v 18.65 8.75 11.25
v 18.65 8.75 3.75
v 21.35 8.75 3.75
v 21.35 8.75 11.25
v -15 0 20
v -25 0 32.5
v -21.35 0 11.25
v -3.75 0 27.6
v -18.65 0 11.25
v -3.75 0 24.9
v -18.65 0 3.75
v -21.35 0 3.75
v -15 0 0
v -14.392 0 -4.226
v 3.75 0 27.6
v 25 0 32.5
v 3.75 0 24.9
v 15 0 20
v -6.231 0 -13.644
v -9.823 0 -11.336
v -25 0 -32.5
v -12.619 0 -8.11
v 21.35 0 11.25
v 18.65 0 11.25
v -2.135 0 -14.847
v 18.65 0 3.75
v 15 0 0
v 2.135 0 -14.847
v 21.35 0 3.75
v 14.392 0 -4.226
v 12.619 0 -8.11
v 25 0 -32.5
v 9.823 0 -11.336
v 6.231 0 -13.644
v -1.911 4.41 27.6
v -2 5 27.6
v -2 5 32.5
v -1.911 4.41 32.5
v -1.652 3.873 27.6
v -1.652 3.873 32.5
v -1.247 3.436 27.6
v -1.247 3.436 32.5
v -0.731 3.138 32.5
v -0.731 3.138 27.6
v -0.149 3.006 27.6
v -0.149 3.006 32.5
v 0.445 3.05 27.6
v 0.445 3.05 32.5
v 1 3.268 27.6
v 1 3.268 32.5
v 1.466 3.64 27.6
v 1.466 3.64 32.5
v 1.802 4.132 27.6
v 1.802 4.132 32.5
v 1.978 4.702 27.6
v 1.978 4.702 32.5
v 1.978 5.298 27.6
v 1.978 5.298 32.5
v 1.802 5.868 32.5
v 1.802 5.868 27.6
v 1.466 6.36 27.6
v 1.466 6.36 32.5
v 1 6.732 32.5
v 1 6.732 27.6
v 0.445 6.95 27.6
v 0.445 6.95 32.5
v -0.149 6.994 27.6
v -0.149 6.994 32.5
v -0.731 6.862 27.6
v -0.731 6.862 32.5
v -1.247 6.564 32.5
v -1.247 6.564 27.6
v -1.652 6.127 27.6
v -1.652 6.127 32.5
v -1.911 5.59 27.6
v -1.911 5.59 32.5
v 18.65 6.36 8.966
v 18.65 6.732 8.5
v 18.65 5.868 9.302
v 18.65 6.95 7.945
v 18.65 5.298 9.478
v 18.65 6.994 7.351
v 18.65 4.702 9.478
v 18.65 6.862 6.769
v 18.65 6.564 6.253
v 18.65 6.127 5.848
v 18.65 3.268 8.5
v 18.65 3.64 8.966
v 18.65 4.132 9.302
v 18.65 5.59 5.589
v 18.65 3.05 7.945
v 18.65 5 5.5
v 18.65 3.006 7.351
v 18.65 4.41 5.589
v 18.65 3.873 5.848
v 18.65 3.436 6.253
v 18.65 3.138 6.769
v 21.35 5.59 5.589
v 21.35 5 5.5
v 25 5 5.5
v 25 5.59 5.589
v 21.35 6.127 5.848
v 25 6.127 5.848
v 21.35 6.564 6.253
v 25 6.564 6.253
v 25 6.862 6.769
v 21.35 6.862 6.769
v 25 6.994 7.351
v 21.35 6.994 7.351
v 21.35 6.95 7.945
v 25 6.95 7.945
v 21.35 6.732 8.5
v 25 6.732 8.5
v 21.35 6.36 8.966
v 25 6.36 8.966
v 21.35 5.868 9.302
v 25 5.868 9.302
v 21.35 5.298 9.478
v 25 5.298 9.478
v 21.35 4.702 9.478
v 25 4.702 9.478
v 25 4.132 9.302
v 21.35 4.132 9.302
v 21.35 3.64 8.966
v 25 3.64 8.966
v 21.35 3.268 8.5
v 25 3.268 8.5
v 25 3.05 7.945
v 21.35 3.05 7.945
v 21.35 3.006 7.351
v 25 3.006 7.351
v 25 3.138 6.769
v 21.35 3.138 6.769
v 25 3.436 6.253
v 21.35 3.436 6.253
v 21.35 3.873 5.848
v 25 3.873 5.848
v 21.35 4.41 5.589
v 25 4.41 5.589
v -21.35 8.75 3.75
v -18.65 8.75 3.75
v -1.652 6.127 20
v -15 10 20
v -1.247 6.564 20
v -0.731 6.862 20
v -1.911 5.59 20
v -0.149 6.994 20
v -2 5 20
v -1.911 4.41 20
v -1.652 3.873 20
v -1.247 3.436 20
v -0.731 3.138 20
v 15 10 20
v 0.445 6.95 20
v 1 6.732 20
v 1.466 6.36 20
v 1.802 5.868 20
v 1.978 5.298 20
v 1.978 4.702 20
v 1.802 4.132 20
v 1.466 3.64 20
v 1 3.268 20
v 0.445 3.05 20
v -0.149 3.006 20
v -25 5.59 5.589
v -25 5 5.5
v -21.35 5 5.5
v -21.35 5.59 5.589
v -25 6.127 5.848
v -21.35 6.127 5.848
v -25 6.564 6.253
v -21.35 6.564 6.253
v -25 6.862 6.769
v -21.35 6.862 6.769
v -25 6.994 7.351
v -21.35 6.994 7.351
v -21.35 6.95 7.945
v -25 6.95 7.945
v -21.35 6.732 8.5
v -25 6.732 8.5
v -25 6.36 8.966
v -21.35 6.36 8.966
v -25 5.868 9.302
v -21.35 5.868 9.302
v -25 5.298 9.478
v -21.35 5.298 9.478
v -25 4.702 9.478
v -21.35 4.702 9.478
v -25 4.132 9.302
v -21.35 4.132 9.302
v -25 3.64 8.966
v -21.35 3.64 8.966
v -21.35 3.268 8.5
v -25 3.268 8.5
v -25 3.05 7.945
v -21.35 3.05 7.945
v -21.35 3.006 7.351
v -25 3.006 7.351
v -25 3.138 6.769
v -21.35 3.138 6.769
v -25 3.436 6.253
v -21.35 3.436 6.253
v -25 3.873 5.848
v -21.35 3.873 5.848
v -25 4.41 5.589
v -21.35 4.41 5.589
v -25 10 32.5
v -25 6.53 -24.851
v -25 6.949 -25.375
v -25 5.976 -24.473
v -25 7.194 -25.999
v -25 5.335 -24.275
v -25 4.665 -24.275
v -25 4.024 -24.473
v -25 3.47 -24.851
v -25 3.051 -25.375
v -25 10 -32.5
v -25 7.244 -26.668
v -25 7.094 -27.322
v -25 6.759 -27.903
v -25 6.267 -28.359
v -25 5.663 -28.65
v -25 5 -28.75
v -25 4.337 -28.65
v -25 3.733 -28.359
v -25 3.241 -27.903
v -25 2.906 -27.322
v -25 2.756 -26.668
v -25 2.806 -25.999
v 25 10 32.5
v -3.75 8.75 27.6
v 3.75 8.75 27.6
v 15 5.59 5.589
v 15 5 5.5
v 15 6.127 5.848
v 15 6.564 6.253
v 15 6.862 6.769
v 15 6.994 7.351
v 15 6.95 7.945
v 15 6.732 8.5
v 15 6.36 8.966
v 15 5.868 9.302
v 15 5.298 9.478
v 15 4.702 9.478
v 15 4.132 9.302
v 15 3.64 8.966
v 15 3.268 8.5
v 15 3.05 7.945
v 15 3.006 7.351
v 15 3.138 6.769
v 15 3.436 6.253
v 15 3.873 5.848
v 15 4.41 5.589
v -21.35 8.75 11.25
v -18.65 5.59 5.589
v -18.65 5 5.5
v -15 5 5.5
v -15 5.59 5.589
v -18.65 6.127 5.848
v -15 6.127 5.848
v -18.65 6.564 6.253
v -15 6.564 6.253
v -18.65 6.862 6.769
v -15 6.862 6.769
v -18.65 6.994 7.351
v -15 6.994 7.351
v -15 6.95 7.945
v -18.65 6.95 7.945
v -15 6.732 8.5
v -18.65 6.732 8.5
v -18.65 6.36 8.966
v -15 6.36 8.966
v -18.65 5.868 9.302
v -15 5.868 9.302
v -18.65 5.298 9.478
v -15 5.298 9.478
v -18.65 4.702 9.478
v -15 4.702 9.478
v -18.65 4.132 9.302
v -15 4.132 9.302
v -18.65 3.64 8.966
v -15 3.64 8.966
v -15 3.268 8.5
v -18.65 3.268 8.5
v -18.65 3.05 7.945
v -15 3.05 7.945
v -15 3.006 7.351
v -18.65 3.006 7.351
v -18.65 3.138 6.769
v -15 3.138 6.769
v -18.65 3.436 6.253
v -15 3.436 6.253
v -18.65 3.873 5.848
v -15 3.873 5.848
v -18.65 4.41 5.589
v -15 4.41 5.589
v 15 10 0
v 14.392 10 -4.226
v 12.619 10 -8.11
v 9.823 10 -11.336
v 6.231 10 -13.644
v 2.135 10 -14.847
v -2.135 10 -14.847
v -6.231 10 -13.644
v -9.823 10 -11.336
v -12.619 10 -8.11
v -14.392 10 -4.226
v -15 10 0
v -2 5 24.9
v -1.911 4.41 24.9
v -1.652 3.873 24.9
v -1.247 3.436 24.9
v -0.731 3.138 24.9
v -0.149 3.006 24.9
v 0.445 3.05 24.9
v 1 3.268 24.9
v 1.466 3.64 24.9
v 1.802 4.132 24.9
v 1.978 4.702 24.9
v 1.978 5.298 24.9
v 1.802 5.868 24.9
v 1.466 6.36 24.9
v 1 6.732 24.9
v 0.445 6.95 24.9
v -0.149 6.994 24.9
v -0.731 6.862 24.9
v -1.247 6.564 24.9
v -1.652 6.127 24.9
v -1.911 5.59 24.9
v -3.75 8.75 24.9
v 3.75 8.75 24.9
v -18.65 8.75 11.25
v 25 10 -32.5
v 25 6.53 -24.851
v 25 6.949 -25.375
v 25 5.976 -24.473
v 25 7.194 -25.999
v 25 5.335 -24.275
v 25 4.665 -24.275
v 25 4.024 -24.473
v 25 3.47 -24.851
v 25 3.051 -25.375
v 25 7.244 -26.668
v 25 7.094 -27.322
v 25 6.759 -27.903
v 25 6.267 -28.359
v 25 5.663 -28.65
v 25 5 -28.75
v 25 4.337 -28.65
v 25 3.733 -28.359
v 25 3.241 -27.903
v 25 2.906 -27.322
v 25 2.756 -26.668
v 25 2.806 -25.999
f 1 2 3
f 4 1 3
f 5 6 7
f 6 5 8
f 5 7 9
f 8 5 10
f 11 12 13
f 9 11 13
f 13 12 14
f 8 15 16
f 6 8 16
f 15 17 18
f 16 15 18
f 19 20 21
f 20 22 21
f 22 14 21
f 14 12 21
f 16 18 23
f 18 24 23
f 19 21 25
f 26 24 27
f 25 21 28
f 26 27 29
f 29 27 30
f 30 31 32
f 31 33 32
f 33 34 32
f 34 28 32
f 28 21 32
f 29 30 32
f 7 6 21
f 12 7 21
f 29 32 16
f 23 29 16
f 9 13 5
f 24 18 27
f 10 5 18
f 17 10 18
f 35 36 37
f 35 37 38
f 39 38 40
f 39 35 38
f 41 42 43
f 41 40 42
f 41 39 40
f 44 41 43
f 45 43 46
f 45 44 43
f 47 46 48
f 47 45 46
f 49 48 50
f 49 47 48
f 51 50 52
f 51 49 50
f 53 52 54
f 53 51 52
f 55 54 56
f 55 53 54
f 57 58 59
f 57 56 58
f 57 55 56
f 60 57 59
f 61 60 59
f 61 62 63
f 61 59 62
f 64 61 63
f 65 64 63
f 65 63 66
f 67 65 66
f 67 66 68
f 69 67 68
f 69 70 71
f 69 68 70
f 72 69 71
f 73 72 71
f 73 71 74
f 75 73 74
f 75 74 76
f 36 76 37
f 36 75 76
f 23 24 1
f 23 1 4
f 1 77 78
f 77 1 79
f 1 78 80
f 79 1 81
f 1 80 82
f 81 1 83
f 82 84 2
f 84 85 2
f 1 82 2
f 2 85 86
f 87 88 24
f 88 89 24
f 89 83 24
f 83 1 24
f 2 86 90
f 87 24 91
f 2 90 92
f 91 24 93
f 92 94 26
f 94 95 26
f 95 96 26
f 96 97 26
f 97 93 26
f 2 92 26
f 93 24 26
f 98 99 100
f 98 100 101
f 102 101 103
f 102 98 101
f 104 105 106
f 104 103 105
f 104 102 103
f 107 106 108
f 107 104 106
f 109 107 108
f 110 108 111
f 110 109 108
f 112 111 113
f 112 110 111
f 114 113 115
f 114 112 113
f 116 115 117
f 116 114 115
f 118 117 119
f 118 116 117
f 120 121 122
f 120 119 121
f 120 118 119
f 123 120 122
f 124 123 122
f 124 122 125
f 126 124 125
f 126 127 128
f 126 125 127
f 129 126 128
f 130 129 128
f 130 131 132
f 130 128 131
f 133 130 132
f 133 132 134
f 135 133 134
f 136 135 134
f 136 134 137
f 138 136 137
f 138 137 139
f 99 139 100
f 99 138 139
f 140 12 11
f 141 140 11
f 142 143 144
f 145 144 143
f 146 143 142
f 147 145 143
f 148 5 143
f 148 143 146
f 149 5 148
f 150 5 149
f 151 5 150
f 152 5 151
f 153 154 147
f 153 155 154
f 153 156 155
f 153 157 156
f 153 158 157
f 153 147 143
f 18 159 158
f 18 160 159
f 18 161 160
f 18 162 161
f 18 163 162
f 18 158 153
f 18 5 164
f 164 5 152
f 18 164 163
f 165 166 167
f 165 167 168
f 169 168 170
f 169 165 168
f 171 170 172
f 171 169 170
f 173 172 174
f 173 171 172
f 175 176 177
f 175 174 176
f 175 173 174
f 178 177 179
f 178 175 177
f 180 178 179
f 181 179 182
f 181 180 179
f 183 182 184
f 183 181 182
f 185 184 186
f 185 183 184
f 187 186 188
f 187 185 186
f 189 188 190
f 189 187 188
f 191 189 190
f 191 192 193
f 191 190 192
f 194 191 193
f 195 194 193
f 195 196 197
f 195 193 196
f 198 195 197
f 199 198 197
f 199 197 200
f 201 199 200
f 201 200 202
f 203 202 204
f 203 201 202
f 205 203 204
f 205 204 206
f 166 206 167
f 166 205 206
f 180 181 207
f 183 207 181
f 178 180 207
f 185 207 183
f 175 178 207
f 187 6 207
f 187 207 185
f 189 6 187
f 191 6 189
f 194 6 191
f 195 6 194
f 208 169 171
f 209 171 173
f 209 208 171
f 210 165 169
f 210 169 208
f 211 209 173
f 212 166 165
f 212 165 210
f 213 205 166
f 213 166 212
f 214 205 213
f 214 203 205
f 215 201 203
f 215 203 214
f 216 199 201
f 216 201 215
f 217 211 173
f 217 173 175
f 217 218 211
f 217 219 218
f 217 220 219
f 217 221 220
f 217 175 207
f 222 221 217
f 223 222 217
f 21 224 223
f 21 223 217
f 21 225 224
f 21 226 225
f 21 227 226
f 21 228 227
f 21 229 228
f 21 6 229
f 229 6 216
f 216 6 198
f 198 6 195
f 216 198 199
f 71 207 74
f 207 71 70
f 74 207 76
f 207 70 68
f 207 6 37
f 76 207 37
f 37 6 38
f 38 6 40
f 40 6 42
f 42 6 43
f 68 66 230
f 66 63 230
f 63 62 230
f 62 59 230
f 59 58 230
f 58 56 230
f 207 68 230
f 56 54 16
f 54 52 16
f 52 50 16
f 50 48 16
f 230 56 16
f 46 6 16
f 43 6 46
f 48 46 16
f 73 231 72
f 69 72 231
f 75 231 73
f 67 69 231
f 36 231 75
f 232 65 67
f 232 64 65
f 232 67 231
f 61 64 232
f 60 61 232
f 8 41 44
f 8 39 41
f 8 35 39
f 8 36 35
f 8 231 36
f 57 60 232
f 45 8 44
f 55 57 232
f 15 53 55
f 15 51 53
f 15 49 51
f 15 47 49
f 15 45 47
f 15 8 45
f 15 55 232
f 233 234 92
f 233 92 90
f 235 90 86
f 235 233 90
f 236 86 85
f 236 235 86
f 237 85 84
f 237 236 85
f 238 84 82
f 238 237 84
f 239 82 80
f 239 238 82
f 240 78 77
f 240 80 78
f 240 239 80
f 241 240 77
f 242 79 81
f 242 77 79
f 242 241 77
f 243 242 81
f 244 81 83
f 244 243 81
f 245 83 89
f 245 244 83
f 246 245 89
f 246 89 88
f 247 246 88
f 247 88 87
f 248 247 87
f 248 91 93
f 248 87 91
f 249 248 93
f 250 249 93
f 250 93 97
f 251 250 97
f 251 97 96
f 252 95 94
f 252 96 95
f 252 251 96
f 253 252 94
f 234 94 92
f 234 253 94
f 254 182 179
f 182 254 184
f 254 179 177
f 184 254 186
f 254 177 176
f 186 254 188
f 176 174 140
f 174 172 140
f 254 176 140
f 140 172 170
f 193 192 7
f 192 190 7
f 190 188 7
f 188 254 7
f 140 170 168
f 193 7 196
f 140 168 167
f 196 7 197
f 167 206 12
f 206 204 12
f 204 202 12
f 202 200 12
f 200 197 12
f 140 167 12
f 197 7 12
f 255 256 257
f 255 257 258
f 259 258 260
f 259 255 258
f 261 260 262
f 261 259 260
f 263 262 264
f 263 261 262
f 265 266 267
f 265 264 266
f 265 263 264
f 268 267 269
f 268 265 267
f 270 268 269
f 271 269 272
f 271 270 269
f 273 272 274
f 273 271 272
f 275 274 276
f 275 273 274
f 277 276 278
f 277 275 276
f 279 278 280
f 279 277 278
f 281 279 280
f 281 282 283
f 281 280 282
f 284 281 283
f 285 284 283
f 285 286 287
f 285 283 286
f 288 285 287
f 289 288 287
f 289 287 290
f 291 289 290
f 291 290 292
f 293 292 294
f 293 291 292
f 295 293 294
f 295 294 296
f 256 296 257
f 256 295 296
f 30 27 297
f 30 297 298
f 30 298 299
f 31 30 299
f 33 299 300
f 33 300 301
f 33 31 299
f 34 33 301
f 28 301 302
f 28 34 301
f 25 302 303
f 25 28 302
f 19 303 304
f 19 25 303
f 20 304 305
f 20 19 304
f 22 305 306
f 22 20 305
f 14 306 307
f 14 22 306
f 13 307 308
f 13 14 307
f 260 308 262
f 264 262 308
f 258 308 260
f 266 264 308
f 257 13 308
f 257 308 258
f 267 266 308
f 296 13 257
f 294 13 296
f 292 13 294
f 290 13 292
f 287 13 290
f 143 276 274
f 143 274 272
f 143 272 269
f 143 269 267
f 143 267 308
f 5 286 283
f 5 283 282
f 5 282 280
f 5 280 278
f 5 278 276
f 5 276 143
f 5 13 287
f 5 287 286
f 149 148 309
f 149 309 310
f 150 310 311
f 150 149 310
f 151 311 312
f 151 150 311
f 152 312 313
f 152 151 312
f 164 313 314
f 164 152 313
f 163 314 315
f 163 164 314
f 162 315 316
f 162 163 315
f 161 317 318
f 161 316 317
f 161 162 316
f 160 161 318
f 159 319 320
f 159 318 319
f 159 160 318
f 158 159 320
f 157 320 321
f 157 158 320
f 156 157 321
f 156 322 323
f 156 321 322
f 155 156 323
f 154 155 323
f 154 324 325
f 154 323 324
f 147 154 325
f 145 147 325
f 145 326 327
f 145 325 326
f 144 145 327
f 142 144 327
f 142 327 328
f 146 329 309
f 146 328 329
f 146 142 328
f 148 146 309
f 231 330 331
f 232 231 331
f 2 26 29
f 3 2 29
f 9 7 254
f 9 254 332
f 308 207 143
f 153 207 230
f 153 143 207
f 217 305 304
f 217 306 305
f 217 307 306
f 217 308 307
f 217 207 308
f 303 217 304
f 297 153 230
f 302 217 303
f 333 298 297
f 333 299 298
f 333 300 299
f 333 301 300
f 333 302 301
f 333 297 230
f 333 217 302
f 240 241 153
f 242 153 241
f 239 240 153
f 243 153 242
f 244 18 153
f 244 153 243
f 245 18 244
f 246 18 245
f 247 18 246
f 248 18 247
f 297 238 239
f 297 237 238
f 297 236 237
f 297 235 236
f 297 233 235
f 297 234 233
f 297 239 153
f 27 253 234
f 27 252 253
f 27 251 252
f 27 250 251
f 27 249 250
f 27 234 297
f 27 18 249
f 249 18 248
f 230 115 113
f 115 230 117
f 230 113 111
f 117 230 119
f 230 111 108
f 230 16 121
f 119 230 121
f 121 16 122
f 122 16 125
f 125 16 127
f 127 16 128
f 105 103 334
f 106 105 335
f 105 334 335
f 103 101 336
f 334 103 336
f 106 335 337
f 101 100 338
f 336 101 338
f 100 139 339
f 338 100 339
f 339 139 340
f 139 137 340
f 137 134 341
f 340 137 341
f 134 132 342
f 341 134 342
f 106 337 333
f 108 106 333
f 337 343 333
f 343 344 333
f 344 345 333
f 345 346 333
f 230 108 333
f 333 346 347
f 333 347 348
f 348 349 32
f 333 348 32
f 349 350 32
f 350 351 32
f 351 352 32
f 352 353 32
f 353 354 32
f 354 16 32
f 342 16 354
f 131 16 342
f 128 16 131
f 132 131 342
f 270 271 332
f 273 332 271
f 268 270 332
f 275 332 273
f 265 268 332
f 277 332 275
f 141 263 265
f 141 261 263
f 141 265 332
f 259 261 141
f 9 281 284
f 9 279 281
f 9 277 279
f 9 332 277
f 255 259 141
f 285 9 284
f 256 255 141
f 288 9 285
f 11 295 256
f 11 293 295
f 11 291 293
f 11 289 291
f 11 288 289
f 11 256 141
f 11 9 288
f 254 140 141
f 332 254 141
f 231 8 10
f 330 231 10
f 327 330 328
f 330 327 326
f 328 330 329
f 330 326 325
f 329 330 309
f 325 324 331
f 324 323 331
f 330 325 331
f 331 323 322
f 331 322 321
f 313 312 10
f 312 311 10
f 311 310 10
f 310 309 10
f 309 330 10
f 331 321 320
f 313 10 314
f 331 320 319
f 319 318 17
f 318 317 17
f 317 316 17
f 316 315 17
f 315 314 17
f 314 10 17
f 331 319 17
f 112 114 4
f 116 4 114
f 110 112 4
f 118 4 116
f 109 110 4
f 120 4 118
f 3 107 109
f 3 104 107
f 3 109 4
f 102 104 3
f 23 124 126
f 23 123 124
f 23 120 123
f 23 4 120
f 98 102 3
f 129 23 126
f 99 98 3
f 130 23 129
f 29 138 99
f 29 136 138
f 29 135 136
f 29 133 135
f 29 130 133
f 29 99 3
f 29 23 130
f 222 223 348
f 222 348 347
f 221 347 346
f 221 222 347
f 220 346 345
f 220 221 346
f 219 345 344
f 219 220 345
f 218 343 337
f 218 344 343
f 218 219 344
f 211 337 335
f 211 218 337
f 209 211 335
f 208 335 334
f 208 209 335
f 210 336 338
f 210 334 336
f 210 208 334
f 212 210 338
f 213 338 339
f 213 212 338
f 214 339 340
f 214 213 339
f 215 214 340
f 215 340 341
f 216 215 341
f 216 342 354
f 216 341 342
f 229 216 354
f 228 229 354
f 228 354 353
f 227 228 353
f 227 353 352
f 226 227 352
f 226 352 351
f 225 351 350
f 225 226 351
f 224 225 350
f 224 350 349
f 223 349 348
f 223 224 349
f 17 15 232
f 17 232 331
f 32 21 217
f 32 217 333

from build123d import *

# Parameters (mm, degrees)
SKETCH1_W               = 50
SKETCH1_H               = 65
BOSS_EXTRUDE1_DEPTH     = 10
CUT_EXTRUDE1_DEPTH      = 43.20485754
CUT_EXTRUDE1_DEPTH_BACK = 43.20485754
SKETCH6_R               = 2
SKETCH6_R_2             = 2.25
SKETCH7_R               = 2
CUT_EXTRUDE2_DEPTH      = 43.20485754
SKETCH8_W               = 2.7
SKETCH8_H               = 7.5
SKETCH8_W_2             = 7.5
SKETCH8_H_2             = 2.7
CUT_EXTRUDE3_DEPTH      = 8.75


with BuildPart() as part:
    # Sketch1 → Boss-Extrude1 (new body)
    with BuildSketch(Plane(origin=(0, 0, 0), x_dir=(1, 0, 0), z_dir=(0, 1, 0))):
        Rectangle(SKETCH1_W, SKETCH1_H)
        with BuildLine():
            Line((-15, 0), (-15, -20))
            Line((-15, -20), (15, -20))
            Line((15, -20), (15, 0))
            ThreePointArc((15, 0), (0, 15), (-15, 0))
        make_face(mode=Mode.SUBTRACT)
    extrude(amount=BOSS_EXTRUDE1_DEPTH)

    # Sketch6 → Cut-Extrude1 (cut, two sides: drawn at the far end of the back side and taken through both)
    with BuildSketch(Plane(origin=(0, 0, 0), x_dir=(0, 0, -1), z_dir=(1, 0, 0)).offset(-CUT_EXTRUDE1_DEPTH_BACK)):
        with Locations((-7.5, 5)):
            Circle(SKETCH6_R)
        with Locations((26.5, 5)):
            Circle(SKETCH6_R_2)
    extrude(amount=CUT_EXTRUDE1_DEPTH + CUT_EXTRUDE1_DEPTH_BACK, mode=Mode.SUBTRACT)

    # Sketch7 → Cut-Extrude2 (cut, through all)
    with BuildSketch(Plane.XY):
        with Locations(Location((0, 5, 0), (0, 0, 180))):
            Circle(SKETCH7_R)
    extrude(amount=CUT_EXTRUDE2_DEPTH, mode=Mode.SUBTRACT)

    # Sketch8 → Cut-Extrude3 (cut)
    with BuildSketch(Plane(origin=(0, 0, 0), x_dir=(1, 0, 0), z_dir=(0, 1, 0))):
        with Locations((20, -7.5)):
            Rectangle(SKETCH8_W, SKETCH8_H)
        with Locations((-20, -7.5)):
            Rectangle(SKETCH8_W, SKETCH8_H)
        with Locations((0, -26.25)):
            Rectangle(SKETCH8_W_2, SKETCH8_H_2)
    extrude(amount=CUT_EXTRUDE3_DEPTH, mode=Mode.SUBTRACT)


solid = part.part
